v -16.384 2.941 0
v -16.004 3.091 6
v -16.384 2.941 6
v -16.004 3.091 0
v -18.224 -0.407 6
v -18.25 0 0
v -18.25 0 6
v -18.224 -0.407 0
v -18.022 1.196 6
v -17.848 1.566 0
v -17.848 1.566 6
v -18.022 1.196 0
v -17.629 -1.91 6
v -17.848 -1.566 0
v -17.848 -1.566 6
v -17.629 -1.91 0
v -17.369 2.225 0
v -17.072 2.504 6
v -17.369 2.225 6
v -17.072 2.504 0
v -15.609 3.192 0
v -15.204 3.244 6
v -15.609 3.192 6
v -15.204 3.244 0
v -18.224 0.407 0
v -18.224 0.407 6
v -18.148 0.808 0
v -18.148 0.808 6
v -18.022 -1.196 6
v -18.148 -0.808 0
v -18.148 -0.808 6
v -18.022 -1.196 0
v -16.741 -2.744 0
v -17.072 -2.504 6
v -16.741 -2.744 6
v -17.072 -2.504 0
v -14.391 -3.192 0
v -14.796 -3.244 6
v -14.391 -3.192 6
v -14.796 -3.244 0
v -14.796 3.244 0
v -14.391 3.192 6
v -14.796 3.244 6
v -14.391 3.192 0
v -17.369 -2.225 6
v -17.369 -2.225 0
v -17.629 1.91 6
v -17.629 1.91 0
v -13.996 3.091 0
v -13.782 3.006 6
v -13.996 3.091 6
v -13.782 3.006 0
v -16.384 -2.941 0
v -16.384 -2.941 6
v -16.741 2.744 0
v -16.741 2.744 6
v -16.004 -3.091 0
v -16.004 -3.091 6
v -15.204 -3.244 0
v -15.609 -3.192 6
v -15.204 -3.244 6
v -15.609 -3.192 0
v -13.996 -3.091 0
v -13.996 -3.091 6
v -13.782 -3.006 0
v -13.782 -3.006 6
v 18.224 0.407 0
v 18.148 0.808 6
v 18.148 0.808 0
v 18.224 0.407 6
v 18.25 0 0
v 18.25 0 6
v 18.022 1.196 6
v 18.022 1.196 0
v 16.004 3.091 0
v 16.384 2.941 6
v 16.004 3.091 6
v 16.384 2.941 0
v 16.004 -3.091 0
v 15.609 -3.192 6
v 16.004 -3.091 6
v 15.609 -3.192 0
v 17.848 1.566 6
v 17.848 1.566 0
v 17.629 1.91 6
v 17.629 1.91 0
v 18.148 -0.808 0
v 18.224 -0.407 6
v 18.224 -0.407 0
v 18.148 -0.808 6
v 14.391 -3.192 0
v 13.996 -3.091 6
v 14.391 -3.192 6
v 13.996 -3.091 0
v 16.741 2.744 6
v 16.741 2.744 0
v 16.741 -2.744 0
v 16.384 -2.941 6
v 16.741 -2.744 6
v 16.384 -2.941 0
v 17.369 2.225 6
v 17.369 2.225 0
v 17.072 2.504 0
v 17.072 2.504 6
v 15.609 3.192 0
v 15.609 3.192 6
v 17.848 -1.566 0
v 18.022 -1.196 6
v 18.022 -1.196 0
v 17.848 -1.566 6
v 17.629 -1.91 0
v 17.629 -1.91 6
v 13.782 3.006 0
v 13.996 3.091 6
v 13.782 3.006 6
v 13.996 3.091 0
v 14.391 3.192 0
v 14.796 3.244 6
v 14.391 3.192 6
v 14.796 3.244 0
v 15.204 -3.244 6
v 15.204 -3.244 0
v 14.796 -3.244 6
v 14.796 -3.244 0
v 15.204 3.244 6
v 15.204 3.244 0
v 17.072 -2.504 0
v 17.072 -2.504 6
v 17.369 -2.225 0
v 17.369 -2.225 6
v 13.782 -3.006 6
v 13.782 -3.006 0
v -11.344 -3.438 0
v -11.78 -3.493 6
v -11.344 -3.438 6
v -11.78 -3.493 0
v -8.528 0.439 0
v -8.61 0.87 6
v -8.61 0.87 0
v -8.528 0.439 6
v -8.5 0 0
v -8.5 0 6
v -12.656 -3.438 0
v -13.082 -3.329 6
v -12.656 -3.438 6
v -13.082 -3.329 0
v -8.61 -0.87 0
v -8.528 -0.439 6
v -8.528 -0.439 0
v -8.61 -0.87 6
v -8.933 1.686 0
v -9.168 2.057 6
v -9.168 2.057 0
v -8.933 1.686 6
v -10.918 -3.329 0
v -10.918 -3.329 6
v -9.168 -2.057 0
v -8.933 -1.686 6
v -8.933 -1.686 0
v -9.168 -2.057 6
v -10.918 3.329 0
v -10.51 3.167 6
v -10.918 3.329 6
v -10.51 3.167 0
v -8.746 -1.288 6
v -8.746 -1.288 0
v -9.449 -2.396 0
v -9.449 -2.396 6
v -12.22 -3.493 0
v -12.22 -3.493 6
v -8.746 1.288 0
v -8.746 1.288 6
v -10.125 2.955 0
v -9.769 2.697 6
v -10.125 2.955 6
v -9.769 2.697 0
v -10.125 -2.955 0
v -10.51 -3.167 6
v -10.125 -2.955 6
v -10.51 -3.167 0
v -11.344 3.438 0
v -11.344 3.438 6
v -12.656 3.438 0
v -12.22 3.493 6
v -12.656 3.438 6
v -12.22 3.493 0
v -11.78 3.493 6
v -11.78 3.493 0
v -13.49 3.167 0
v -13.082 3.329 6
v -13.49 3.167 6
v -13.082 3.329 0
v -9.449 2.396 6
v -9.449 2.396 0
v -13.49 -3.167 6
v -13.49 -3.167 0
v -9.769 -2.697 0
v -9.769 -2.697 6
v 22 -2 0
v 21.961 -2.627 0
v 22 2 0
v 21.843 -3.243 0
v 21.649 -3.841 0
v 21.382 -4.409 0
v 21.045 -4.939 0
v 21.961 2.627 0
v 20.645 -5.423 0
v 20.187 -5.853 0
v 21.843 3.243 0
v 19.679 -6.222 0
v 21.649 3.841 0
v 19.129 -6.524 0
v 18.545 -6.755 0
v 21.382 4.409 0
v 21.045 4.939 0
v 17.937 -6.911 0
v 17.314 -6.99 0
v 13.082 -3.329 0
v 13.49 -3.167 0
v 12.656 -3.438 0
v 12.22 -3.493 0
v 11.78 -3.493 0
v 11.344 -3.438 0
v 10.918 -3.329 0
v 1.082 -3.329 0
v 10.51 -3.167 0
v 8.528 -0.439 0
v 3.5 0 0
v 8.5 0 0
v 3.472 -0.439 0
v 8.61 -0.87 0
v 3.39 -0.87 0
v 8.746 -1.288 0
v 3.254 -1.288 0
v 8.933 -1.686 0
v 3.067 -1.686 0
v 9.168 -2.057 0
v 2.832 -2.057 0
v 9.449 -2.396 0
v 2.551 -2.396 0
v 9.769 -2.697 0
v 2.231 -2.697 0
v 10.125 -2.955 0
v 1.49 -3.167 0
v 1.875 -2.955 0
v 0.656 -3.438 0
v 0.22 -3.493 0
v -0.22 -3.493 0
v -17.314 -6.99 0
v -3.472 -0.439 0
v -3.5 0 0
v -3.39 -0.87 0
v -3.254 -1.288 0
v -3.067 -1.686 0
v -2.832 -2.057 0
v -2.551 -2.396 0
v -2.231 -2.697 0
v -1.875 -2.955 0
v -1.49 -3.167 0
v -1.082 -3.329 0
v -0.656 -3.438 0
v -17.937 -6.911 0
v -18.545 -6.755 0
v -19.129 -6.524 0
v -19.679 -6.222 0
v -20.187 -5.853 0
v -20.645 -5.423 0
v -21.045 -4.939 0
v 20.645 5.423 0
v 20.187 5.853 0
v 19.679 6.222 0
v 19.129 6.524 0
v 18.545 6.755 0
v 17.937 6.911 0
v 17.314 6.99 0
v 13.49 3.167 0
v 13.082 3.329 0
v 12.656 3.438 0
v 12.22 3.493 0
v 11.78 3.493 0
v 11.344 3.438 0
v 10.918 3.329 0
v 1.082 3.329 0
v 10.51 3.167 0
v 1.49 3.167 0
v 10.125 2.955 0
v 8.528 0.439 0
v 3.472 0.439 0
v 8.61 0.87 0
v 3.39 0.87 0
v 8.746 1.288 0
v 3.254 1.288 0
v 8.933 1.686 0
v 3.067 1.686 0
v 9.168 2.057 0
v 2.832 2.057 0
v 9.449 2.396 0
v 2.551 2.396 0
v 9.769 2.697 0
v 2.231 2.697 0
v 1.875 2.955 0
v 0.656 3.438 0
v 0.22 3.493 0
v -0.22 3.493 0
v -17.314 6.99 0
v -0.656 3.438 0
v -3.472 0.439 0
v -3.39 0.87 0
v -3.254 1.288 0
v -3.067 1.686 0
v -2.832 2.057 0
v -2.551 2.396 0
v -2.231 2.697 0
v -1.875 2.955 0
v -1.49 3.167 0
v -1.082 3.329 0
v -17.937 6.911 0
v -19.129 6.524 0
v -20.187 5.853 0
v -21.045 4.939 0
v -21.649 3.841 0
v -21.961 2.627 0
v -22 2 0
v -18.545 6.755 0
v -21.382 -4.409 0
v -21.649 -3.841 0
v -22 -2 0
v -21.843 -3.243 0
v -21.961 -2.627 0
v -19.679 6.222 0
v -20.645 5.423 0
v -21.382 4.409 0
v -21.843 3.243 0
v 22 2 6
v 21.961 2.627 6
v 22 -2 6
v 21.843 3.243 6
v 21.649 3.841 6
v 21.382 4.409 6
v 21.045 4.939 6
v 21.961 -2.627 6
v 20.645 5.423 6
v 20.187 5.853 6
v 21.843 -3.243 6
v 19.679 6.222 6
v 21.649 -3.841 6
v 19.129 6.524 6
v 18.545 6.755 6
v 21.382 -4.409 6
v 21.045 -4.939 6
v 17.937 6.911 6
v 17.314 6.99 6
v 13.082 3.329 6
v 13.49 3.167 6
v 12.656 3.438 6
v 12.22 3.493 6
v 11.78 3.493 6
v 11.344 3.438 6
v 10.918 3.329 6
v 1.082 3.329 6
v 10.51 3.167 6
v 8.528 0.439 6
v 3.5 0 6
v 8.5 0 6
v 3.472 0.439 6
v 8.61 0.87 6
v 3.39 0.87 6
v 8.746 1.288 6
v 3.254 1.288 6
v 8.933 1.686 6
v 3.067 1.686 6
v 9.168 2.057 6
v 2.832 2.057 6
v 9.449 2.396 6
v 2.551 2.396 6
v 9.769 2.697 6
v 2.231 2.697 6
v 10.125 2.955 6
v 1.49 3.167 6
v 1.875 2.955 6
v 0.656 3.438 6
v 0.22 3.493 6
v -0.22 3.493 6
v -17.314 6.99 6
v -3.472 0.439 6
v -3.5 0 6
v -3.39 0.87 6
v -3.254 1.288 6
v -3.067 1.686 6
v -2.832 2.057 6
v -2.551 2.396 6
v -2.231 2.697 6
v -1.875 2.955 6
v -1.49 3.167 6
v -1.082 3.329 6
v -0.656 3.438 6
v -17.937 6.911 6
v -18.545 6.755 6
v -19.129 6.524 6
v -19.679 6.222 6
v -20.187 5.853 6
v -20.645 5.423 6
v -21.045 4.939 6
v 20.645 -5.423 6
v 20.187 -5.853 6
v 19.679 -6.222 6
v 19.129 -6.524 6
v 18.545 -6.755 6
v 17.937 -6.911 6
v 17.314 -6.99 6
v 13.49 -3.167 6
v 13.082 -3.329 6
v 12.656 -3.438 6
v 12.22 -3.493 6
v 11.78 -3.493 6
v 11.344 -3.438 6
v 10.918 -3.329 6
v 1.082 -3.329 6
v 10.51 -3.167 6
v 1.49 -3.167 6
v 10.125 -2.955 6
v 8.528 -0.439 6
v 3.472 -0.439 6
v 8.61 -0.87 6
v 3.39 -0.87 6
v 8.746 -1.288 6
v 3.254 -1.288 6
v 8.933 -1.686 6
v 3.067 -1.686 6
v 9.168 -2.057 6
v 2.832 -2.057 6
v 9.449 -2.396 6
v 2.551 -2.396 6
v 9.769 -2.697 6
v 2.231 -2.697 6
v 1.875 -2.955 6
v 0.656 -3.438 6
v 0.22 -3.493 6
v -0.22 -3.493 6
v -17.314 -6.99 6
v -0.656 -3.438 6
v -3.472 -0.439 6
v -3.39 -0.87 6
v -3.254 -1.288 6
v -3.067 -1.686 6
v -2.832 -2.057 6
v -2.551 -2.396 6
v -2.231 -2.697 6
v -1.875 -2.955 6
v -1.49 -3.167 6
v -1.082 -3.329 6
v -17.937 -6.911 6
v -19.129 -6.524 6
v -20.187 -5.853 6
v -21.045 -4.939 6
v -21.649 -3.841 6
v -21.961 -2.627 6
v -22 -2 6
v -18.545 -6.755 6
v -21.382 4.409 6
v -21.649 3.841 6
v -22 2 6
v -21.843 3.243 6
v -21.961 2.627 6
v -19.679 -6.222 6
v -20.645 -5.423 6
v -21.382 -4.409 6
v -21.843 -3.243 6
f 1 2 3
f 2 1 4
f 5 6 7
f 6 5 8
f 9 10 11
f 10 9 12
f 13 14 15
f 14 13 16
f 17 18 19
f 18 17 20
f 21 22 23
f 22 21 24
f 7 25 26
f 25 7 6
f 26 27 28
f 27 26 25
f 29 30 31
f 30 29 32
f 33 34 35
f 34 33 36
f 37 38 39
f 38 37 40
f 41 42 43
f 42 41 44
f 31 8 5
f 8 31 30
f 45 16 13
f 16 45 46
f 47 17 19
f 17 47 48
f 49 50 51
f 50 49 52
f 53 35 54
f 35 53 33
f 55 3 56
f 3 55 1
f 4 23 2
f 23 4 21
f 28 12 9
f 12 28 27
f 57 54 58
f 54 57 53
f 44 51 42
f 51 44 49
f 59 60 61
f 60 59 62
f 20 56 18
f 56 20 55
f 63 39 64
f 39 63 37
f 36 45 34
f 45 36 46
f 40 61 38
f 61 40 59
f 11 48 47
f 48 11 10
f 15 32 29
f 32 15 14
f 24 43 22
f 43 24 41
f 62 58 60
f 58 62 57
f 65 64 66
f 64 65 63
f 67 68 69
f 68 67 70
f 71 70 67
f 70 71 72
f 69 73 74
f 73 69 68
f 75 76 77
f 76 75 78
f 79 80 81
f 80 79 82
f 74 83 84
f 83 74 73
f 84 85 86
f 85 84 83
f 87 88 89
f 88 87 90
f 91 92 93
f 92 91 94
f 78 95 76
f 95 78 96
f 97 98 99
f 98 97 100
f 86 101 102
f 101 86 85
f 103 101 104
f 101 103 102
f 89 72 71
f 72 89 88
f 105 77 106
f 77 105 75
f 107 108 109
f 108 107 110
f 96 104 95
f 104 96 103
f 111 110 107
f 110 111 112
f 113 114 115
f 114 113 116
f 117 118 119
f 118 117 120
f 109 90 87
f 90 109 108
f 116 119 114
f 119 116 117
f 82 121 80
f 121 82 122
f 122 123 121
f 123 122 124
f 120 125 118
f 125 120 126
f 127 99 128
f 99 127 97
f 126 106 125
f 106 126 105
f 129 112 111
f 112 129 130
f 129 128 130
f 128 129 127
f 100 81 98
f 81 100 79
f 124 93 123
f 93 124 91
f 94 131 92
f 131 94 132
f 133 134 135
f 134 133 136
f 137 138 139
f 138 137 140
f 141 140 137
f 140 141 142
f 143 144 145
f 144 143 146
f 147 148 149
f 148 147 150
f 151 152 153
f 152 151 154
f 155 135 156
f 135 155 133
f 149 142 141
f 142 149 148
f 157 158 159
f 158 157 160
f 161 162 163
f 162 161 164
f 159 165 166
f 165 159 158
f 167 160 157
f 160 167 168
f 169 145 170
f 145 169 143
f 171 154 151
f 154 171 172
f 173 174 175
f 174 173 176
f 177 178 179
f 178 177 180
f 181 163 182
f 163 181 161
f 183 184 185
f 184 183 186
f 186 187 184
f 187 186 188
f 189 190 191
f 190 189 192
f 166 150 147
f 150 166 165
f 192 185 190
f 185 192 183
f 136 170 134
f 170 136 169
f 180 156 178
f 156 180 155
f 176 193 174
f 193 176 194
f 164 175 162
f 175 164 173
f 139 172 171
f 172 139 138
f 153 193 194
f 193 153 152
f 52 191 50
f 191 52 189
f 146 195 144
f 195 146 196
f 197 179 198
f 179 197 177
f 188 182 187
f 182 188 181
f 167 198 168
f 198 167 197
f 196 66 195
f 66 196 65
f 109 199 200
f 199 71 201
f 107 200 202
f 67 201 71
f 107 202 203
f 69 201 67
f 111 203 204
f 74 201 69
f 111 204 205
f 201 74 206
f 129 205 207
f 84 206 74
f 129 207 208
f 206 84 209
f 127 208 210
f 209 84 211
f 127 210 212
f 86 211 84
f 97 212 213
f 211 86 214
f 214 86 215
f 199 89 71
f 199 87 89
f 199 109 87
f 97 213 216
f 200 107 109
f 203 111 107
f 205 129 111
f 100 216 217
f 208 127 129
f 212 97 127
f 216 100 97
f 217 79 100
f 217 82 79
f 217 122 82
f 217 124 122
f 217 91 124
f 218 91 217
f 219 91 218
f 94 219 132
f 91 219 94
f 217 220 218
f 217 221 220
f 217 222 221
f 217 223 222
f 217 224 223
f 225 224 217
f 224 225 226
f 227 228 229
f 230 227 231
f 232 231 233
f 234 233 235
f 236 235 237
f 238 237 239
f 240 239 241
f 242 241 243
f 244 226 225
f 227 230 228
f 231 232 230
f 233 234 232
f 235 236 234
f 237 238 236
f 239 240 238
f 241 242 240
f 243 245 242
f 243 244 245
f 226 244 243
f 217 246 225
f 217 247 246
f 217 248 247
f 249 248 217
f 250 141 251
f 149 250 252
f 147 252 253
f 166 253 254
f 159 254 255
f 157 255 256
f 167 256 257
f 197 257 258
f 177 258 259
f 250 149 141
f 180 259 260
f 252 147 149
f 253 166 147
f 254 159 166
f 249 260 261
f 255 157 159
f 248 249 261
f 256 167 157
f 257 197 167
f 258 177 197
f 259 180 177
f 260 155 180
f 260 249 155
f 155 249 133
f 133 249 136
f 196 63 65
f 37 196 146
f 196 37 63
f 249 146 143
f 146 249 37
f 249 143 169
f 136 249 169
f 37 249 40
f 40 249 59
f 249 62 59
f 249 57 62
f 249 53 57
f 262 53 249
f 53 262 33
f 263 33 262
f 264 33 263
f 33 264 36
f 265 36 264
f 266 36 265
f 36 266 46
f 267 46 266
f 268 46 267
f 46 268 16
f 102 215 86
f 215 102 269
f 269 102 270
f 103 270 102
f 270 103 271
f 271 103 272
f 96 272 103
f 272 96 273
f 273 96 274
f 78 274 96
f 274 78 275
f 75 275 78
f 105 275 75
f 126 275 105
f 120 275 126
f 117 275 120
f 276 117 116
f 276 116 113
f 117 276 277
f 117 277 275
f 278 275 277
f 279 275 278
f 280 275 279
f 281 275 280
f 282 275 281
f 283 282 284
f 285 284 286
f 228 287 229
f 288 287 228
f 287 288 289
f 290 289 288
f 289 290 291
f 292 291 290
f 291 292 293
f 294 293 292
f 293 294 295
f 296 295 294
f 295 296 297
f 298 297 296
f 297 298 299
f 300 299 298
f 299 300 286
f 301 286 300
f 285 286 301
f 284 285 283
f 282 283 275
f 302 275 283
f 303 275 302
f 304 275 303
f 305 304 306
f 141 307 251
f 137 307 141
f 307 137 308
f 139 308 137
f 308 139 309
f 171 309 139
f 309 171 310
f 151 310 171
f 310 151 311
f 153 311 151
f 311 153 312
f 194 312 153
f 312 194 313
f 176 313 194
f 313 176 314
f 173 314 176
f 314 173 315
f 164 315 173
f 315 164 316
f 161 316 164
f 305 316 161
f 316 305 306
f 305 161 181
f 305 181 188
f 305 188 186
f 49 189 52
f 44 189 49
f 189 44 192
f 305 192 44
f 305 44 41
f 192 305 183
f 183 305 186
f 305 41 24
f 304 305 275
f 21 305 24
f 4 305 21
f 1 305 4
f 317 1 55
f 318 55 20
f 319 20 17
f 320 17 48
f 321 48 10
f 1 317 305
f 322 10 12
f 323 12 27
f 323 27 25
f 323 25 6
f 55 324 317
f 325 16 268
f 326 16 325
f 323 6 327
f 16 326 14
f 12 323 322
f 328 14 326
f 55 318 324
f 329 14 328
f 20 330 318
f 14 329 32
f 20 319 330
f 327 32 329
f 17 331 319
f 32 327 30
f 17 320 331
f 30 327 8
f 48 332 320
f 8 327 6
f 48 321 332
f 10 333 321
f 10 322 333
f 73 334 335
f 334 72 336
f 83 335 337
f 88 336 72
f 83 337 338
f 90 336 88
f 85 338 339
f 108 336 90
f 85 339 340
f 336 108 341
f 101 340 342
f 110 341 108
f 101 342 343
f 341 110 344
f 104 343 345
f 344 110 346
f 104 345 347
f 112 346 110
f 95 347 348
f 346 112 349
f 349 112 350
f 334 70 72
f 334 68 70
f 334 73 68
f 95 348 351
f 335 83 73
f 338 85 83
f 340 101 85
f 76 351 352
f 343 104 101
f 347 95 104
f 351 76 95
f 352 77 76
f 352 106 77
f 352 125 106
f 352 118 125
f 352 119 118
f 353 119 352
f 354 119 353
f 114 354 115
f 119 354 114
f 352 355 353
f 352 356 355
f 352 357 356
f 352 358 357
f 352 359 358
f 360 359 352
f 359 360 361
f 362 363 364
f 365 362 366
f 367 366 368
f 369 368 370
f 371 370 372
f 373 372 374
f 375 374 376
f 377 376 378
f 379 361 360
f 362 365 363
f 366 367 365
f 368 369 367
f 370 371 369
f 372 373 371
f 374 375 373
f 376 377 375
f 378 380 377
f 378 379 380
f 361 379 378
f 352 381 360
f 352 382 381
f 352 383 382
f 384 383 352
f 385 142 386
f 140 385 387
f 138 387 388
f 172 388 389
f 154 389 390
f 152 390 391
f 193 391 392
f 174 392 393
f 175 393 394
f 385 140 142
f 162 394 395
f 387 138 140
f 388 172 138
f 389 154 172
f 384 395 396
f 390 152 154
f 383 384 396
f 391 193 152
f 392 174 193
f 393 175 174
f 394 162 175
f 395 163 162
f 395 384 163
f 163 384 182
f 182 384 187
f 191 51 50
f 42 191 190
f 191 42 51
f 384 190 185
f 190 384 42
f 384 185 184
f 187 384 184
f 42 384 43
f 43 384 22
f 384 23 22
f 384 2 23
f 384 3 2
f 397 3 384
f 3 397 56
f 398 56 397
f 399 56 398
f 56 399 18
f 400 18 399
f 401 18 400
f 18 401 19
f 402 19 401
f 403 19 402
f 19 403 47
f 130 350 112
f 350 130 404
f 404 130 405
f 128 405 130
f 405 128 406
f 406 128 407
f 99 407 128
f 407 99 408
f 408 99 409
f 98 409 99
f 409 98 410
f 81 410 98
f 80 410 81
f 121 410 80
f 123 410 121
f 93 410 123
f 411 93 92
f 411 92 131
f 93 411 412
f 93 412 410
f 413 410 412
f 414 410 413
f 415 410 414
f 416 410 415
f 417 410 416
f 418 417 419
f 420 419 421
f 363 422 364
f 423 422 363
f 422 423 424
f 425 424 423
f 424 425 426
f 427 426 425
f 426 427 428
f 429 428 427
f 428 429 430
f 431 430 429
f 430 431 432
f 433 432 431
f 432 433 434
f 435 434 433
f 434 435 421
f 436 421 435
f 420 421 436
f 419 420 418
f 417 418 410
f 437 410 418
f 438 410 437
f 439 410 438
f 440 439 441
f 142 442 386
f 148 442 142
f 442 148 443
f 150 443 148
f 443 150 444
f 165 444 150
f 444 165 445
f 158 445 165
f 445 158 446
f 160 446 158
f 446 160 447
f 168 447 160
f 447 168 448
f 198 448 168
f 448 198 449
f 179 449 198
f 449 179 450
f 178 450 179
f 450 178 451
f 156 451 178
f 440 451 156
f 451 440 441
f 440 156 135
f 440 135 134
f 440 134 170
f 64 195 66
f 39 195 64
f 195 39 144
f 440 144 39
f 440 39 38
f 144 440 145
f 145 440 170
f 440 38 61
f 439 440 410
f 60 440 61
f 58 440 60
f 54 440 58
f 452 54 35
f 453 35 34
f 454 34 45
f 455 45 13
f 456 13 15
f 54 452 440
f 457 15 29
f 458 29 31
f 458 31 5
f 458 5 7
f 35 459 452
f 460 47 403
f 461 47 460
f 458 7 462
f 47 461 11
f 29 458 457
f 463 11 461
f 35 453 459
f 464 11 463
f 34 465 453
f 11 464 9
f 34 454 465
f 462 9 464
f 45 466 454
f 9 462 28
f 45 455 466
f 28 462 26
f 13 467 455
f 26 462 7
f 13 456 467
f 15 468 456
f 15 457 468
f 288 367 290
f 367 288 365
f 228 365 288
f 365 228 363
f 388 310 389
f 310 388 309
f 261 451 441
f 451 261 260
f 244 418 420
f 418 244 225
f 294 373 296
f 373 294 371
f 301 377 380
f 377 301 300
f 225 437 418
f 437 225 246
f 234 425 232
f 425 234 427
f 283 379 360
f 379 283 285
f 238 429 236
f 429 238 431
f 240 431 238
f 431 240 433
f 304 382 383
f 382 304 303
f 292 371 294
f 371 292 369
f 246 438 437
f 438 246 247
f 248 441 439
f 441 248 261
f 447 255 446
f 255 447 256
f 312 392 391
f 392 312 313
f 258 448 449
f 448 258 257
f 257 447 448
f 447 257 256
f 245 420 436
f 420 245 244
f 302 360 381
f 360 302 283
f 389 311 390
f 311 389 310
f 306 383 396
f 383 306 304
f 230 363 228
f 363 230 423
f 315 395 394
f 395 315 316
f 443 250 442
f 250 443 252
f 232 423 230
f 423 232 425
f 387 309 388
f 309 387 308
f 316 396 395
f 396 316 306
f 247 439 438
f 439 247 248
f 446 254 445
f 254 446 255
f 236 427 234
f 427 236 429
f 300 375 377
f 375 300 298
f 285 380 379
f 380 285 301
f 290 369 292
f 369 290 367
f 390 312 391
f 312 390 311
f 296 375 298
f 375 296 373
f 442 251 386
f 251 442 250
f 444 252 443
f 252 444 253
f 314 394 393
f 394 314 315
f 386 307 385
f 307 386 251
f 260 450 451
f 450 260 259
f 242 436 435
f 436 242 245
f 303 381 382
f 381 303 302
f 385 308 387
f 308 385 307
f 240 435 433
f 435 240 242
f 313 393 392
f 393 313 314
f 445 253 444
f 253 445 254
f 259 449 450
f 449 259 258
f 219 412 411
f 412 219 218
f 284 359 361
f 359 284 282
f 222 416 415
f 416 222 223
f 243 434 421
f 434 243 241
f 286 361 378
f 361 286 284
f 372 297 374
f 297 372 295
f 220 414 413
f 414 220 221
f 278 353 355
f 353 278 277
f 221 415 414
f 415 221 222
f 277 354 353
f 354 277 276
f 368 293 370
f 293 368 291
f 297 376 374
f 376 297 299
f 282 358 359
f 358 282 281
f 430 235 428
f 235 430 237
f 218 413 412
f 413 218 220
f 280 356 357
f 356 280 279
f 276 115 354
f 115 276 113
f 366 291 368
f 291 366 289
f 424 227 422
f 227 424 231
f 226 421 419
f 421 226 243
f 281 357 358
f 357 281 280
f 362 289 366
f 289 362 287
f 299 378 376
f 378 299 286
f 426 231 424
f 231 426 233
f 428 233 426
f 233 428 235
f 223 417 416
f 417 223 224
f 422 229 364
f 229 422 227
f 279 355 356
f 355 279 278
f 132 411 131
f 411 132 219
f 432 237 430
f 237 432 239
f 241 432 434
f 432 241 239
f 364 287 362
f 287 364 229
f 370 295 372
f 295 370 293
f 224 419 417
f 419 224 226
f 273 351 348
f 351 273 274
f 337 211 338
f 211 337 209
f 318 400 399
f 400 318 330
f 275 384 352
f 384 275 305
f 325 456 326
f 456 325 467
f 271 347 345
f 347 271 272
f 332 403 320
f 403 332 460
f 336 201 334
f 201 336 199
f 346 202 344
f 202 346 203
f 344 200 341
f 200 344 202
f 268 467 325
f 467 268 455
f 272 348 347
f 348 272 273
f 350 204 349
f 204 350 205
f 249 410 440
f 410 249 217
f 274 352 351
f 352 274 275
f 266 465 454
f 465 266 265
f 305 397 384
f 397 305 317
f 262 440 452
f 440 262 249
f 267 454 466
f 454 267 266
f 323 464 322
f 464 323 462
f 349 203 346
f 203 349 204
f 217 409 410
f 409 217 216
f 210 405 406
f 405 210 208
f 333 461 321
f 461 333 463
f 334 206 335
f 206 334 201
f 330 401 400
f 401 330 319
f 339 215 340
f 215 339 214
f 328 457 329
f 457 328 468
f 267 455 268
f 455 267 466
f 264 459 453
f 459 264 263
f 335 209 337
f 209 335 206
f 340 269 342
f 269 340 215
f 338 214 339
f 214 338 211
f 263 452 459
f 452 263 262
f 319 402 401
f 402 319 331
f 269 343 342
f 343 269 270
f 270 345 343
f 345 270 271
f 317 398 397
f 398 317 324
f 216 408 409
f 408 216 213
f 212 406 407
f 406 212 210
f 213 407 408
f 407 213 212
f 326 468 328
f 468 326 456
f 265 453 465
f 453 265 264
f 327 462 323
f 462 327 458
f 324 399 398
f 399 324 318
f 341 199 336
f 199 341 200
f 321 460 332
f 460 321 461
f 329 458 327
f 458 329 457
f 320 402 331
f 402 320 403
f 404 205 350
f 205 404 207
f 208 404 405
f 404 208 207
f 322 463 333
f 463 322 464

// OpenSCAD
$fn = 50;


difference() {
	union() {
		hull() {
			translate(v = [-17.0000000000, 2.0000000000, 0]) {
				cylinder(h = 6, r = 5);
			}
			translate(v = [17.0000000000, 2.0000000000, 0]) {
				cylinder(h = 6, r = 5);
			}
			translate(v = [-17.0000000000, -2.0000000000, 0]) {
				cylinder(h = 6, r = 5);
			}
			translate(v = [17.0000000000, -2.0000000000, 0]) {
				cylinder(h = 6, r = 5);
			}
		}
	}
	union() {
		#translate(v = [-15.0000000000, 0.0000000000, -100.0000000000]) {
			cylinder(h = 200, r = 3.2500000000);
		}
		#translate(v = [-15.0000000000, 0.0000000000, -100.0000000000]) {
			cylinder(h = 200, r = 3.2500000000);
		}
		#translate(v = [15.0000000000, 0.0000000000, -100.0000000000]) {
			cylinder(h = 200, r = 3.2500000000);
		}
		#translate(v = [15.0000000000, 0.0000000000, -100.0000000000]) {
			cylinder(h = 200, r = 3.2500000000);
		}
		#translate(v = [-12.0000000000, 0, 0]) {
			cylinder(h = 6, r = 3.5000000000);
		}
		#cylinder(h = 6, r = 3.5000000000);
		#translate(v = [12.0000000000, 0, 0]) {
			cylinder(h = 6, r = 3.5000000000);
		}
	}
}
